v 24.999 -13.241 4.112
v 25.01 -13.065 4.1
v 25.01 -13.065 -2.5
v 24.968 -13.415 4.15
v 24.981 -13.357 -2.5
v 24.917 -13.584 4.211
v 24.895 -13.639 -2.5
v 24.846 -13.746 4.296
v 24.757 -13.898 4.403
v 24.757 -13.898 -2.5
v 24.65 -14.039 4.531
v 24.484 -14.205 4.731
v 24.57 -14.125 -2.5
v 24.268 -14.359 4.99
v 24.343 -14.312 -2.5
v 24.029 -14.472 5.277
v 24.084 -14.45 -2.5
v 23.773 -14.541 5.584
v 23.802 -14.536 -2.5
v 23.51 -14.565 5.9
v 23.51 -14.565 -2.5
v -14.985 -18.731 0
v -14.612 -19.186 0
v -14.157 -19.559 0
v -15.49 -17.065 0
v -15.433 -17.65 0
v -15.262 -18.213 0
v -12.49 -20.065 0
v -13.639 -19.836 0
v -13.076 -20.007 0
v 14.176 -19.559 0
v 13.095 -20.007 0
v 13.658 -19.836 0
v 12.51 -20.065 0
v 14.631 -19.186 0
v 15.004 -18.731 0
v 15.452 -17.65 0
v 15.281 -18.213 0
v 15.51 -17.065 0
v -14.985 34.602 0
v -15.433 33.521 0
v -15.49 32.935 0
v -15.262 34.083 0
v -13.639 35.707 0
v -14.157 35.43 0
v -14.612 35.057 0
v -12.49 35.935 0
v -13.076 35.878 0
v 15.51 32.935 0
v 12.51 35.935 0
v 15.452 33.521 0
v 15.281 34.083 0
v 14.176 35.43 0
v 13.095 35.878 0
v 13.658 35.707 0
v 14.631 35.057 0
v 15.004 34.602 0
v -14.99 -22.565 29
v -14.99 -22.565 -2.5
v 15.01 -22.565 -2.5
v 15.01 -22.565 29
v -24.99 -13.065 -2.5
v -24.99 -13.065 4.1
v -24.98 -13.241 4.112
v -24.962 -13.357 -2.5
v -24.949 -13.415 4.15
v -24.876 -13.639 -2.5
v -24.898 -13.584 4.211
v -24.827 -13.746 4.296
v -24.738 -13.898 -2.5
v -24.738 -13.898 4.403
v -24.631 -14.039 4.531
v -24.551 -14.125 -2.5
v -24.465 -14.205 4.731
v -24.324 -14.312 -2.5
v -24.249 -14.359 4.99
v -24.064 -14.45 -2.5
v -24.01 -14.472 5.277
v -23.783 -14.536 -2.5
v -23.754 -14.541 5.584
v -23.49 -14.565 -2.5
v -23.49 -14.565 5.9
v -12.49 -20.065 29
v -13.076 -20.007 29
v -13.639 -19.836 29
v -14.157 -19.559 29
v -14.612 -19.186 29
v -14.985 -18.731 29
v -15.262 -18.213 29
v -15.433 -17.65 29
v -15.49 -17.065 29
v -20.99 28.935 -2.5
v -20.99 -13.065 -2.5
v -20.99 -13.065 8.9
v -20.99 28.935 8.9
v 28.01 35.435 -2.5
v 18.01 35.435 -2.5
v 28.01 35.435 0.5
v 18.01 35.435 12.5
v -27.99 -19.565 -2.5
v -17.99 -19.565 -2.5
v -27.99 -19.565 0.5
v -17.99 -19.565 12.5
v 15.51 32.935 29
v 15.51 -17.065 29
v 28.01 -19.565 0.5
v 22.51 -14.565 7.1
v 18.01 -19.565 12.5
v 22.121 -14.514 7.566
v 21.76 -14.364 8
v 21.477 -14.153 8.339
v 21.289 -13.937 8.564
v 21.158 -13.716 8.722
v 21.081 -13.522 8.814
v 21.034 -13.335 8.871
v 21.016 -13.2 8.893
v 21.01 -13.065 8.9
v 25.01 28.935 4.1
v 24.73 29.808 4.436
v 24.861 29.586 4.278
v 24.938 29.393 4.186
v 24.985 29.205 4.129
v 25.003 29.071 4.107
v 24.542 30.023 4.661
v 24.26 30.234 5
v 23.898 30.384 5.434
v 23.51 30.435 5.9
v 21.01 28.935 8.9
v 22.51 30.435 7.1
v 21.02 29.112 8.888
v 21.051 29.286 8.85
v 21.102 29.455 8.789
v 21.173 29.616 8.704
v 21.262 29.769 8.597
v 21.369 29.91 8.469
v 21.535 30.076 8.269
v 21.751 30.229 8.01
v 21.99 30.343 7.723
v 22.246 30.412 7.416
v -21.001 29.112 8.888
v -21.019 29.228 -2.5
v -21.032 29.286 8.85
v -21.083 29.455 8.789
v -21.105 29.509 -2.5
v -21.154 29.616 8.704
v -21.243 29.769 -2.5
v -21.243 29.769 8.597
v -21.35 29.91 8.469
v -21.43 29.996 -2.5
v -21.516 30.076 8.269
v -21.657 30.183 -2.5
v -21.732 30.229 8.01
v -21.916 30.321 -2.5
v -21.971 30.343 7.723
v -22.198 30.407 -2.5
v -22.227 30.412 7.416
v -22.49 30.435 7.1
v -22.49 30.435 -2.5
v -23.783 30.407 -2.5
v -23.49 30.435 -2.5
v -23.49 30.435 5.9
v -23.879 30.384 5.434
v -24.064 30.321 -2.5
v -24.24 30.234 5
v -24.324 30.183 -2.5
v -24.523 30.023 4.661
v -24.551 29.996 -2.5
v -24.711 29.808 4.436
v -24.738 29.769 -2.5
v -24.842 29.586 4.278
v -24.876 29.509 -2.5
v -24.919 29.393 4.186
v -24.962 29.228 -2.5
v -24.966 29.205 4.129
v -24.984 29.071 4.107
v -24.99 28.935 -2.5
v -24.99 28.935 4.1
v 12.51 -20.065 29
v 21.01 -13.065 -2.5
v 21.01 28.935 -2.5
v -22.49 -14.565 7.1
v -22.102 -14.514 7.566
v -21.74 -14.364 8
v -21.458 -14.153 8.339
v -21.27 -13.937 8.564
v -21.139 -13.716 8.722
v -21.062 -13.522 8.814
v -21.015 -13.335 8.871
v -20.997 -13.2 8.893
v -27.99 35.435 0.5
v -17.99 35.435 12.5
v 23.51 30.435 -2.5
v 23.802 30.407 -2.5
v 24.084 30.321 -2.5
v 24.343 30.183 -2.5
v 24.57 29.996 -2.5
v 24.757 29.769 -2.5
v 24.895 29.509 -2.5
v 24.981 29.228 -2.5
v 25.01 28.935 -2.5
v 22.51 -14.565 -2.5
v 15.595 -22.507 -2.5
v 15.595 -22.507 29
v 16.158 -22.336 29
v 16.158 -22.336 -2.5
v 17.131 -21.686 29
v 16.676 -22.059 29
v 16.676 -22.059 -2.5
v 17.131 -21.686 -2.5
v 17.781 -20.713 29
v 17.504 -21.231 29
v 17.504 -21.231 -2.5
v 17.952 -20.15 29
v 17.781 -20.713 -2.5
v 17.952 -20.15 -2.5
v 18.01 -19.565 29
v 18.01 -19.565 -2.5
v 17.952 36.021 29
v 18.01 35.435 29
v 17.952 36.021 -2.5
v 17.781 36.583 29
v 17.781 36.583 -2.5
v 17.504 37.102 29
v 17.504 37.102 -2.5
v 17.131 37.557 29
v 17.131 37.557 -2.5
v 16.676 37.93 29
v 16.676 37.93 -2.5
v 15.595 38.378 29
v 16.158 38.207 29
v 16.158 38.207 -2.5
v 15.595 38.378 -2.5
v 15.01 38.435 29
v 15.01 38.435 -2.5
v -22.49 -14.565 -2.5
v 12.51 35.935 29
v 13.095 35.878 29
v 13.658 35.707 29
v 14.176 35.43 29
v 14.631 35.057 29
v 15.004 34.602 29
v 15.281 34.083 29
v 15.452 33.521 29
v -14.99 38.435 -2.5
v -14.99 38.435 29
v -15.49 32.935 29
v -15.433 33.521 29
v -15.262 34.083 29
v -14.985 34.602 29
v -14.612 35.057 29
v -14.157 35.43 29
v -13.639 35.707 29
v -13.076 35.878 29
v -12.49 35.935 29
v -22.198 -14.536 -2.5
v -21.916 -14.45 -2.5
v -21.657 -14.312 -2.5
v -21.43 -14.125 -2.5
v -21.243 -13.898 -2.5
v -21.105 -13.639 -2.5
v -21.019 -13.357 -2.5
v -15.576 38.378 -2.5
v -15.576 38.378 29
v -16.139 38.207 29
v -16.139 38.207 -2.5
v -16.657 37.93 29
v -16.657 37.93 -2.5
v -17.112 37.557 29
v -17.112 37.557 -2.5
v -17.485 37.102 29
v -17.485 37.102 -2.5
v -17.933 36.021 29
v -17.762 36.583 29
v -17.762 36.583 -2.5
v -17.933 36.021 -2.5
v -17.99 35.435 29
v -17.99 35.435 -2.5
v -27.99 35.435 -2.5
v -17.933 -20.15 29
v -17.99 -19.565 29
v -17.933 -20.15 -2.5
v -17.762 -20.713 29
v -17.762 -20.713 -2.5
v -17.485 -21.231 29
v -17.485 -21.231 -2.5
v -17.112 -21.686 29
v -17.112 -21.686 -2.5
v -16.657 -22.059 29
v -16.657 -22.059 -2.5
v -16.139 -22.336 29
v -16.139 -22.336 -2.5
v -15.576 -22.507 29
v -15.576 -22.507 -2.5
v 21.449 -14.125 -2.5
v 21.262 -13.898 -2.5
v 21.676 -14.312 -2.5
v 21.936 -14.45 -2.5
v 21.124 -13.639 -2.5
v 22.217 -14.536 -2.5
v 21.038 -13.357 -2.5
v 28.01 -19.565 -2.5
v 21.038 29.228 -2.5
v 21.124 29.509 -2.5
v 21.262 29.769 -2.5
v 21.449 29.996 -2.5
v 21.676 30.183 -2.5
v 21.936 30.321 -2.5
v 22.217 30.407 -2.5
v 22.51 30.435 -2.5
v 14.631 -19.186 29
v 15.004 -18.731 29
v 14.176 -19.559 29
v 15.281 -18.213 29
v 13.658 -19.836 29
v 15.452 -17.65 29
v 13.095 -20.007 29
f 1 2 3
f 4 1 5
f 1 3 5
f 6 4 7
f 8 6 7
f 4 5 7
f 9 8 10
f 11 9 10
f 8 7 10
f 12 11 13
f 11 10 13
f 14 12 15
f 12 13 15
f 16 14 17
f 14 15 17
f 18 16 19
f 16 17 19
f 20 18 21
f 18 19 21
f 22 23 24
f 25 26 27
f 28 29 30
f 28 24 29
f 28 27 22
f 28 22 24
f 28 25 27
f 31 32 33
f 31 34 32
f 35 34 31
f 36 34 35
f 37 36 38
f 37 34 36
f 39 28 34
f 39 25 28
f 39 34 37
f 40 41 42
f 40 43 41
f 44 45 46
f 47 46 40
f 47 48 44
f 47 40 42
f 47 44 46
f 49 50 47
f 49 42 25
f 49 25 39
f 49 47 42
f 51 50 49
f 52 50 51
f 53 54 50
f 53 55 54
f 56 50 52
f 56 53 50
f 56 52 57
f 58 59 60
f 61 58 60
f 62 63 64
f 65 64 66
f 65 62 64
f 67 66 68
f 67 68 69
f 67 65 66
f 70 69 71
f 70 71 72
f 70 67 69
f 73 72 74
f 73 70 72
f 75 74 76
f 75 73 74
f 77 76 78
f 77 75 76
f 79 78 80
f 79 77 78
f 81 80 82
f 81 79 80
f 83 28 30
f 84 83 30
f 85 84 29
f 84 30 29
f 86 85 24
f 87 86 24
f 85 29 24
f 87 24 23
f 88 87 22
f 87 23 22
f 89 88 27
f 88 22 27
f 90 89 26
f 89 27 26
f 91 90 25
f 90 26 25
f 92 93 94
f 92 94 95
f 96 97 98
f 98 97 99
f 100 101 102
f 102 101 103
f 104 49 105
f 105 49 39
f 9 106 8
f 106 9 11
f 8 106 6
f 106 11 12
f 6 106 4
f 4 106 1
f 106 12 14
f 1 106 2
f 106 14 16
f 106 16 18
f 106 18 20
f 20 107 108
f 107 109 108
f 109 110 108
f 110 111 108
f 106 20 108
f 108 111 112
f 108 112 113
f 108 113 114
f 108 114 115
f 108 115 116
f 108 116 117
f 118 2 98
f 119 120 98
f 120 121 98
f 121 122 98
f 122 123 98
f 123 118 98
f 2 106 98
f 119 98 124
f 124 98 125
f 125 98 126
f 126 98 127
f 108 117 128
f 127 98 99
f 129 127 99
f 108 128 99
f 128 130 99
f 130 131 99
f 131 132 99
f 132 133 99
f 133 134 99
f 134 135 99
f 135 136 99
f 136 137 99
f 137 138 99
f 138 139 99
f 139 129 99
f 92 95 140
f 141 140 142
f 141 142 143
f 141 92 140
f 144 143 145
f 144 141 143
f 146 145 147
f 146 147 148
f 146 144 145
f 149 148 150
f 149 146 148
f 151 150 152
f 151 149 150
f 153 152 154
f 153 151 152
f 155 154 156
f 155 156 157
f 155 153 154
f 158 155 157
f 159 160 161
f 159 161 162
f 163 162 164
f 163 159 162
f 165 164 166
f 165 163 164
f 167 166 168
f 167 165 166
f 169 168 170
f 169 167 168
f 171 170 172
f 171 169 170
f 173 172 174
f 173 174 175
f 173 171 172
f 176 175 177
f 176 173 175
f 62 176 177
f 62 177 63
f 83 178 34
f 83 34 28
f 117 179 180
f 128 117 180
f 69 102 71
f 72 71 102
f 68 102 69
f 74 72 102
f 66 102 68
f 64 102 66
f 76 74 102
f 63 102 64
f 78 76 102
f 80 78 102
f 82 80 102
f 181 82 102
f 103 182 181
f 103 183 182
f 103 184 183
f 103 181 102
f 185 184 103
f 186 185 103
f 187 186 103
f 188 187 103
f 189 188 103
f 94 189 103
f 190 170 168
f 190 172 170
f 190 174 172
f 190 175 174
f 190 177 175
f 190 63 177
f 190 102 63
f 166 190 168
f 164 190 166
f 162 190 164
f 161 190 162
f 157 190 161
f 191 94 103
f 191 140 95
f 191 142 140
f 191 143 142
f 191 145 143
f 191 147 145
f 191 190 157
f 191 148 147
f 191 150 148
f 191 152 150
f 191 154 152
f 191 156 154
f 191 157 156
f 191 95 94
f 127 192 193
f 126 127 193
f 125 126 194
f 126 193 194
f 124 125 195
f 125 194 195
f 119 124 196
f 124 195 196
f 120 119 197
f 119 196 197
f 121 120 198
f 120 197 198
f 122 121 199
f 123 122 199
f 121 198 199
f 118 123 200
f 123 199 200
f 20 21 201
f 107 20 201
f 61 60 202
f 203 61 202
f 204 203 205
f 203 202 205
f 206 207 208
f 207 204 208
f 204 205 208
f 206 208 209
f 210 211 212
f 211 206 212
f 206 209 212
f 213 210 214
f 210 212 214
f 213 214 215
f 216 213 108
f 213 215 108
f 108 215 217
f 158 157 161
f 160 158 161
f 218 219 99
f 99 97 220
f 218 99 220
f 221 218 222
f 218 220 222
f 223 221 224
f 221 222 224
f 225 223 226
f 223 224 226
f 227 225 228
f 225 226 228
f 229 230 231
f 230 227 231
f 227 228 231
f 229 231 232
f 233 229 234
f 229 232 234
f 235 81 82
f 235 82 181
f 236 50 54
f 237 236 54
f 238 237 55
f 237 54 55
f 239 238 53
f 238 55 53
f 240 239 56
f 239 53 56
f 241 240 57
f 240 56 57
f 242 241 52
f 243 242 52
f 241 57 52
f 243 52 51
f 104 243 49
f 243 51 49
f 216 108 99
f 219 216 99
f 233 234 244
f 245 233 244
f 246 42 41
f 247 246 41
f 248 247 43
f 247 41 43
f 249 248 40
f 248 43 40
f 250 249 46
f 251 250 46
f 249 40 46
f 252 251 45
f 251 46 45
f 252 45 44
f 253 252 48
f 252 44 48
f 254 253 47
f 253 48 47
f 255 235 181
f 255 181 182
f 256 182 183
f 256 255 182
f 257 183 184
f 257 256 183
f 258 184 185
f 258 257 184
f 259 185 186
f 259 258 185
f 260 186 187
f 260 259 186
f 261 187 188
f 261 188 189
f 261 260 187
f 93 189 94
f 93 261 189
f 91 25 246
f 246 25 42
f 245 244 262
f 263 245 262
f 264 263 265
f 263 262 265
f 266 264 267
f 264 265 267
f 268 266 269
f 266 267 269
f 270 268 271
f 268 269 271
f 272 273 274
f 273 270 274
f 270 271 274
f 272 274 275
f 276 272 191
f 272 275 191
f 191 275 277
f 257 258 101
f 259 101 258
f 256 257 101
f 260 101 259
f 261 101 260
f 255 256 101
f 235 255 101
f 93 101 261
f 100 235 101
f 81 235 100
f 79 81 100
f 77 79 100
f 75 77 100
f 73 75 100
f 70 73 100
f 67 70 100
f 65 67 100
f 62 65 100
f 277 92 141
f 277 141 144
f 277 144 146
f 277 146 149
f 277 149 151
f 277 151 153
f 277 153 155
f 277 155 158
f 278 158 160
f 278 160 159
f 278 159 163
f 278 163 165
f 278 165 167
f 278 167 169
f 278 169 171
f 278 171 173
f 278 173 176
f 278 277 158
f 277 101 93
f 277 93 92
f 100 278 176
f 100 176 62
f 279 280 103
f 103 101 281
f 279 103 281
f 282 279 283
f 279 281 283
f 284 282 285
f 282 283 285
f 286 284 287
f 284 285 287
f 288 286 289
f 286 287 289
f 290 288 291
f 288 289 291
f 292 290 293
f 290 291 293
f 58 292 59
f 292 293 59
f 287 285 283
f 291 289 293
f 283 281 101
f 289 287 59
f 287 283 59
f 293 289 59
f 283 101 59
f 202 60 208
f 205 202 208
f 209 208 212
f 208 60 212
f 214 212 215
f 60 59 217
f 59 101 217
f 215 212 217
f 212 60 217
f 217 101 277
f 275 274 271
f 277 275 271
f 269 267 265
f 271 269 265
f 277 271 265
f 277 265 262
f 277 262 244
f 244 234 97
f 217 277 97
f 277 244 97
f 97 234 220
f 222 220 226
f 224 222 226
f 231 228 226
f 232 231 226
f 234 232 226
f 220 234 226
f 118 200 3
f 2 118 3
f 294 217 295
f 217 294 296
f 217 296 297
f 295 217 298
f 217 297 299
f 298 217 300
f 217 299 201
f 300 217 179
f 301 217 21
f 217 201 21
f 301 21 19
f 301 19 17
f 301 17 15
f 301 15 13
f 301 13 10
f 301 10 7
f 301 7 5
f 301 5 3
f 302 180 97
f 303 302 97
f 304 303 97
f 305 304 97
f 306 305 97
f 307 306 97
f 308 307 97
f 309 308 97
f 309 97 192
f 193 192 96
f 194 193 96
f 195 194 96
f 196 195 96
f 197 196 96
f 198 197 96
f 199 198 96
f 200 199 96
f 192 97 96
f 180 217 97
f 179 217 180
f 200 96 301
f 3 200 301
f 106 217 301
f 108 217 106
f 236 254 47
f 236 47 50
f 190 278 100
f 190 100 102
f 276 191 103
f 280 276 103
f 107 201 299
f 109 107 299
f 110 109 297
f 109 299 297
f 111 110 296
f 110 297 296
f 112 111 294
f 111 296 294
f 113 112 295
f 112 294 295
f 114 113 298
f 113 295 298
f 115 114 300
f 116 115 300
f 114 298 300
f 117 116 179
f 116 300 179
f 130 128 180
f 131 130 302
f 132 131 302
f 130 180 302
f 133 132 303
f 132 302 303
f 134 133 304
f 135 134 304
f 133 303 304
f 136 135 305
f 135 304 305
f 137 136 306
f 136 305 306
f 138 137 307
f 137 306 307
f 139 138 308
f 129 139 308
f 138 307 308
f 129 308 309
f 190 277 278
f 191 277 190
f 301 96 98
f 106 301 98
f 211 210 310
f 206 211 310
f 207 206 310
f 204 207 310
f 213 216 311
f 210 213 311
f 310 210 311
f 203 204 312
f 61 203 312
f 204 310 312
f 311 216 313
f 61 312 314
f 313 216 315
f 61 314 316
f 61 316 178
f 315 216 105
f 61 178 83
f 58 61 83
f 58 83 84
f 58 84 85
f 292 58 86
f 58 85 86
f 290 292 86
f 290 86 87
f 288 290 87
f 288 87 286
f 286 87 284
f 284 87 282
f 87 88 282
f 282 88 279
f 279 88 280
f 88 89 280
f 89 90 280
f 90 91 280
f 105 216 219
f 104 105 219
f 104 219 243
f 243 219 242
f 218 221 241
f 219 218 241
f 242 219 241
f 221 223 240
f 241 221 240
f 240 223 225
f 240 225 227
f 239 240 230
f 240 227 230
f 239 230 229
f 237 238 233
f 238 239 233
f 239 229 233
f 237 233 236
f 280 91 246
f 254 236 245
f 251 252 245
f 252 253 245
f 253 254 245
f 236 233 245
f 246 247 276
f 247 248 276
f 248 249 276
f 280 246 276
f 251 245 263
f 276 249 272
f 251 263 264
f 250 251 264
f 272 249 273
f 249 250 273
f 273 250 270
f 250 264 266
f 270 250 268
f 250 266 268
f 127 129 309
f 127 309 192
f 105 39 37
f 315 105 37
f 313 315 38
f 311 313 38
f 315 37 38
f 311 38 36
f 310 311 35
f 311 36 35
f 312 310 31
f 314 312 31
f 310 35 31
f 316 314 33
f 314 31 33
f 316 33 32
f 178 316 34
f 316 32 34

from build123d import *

# Parameters (mm, degrees)
SHELL_DEPTH         = 29
BOTTOM_START        = 2.5
BOTTOM_COVER_DEPTH  = 2.5
BOSS_EXTRUDE4_DEPTH = 55
CUT_EXTRUDE1_DEPTH  = 64


with BuildPart() as part:
    # Sketch1 → Shell (new body)
    with BuildSketch(Plane.XY):
        with BuildLine():
            Line((-14.99046496, 38.43538022), (15.00953504, 38.43538022))
            ThreePointArc((15.00953504, 38.43538022), (17.130855384, 37.556700564), (18.00953504, 35.43538022))
            Line((18.00953504, 35.43538022), (18.00953504, -19.56461978))
            ThreePointArc((18.00953504, -19.56461978), (17.130855384, -21.685940124), (15.00953504, -22.56461978))
            Line((15.00953504, -22.56461978), (-14.99046496, -22.56461978))
            ThreePointArc((-14.99046496, -22.56461978), (-17.111785303, -21.685940124), (-17.99046496, -19.56461978))
            Line((-17.99046496, -19.56461978), (-17.99046496, 35.43538022))
            ThreePointArc((-17.99046496, 35.43538022), (-17.111785303, 37.556700564), (-14.99046496, 38.43538022))
        make_face()
        with BuildLine():
            Line((-12.49046496, 35.93538022), (12.50953504, 35.93538022))
            ThreePointArc((12.50953504, 35.93538022), (14.630855384, 35.056700564), (15.50953504, 32.93538022))
            Line((15.50953504, 32.93538022), (15.50953504, -17.06461978))
            ThreePointArc((15.50953504, -17.06461978), (14.630855384, -19.185940124), (12.50953504, -20.06461978))
            Line((12.50953504, -20.06461978), (-12.49046496, -20.06461978))
            ThreePointArc((-12.49046496, -20.06461978), (-14.611785303, -19.185940124), (-15.49046496, -17.06461978))
            Line((-15.49046496, -17.06461978), (-15.49046496, 32.93538022))
            ThreePointArc((-15.49046496, 32.93538022), (-14.611785303, 35.056700564), (-12.49046496, 35.93538022))
        make_face(mode=Mode.SUBTRACT)
    extrude(amount=SHELL_DEPTH)

    # Sketch3 → Bottom cover (add)
    with BuildSketch(Plane(origin=(0, 0, 0), x_dir=(-1, 0, 0), z_dir=(0, 0, -1)).offset(BOTTOM_START)):
        with BuildLine():
            Line((-15.00953504, 38.43538022), (14.99046496, 38.43538022))
            ThreePointArc((14.99046496, 38.43538022), (17.111785303, 37.556700564), (17.99046496, 35.43538022))
            Line((17.99046496, 35.43538022), (17.99046496, -19.56461978))
            ThreePointArc((17.99046496, -19.56461978), (17.111785303, -21.685940124), (14.99046496, -22.56461978))
            Line((14.99046496, -22.56461978), (-15.00953504, -22.56461978))
            ThreePointArc((-15.00953504, -22.56461978), (-17.130855384, -21.685940124), (-18.00953504, -19.56461978))
            Line((-18.00953504, -19.56461978), (-18.00953504, 35.43538022))
            ThreePointArc((-18.00953504, 35.43538022), (-17.130855384, 37.556700564), (-15.00953504, 38.43538022))
        make_face()
    extrude(amount=-BOTTOM_COVER_DEPTH)


with BuildPart() as boss_extrude4_tool:
    # 3DSketch1 → Boss-Extrude4 (new body)
    with BuildSketch(Plane(origin=(18.009536245, 35.43538022, -2.500000038), x_dir=(-0.99788010602318, 0, 0.06507913646605183), z_dir=(0, 1, 0))):
        Polygon((0, 0), (-9.97880106, 0.650791365), (-9.783563651, 3.644431683), (0.976187047, 14.96820159), align=None)
        Polygon((35.923685021, -2.342848953), (45.902486082, -2.993640318), (46.097723491, 0), (36.899872068, 12.625352637), align=None)
    extrude(amount=-BOSS_EXTRUDE4_DEPTH)


with BuildPart() as part_1:
    add(part.part)


with BuildPart() as part_2:
    # Boss-Extrude4: joined with boss_extrude4_tool
    add(part_1.part.fuse(boss_extrude4_tool.part, tol=0.00001))

    # Sketch9 → Cut-Extrude1 (cut)
    with BuildSketch(Plane(origin=(0, 0, -2.5), x_dir=(-1, 0, 0), z_dir=(0, 0, -1))):
        with BuildLine():
            Line((-23.50953504, -14.56461978), (-22.50953504, -14.56461978))
            ThreePointArc((-22.50953504, -14.56461978), (-21.448874869, -14.125279952), (-21.00953504, -13.06461978))
            Line((-21.00953504, -13.06461978), (-21.00953504, 28.93538022))
            ThreePointArc((-21.00953504, 28.93538022), (-21.448874869, 29.996040392), (-22.50953504, 30.43538022))
            Line((-22.50953504, 30.43538022), (-23.50953504, 30.43538022))
            ThreePointArc((-23.50953504, 30.43538022), (-24.570195212, 29.996040392), (-25.00953504, 28.93538022))
            Line((-25.00953504, 28.93538022), (-25.00953504, -13.06461978))
            ThreePointArc((-25.00953504, -13.06461978), (-24.570195212, -14.125279952), (-23.50953504, -14.56461978))
        make_face()
        with BuildLine():
            Line((22.49046496, 30.43538022), (23.49046496, 30.43538022))
            ThreePointArc((23.49046496, 30.43538022), (24.551125131, 29.996040392), (24.99046496, 28.93538022))
            Line((24.99046496, 28.93538022), (24.99046496, -13.06461978))
            ThreePointArc((24.99046496, -13.06461978), (24.551125131, -14.125279952), (23.49046496, -14.56461978))
            Line((23.49046496, -14.56461978), (22.49046496, -14.56461978))
            ThreePointArc((22.49046496, -14.56461978), (21.429804788, -14.125279952), (20.99046496, -13.06461978))
            Line((20.99046496, -13.06461978), (20.99046496, 28.93538022))
            ThreePointArc((20.99046496, 28.93538022), (21.429804788, 29.996040392), (22.49046496, 30.43538022))
        make_face()
    extrude(amount=-CUT_EXTRUDE1_DEPTH, mode=Mode.SUBTRACT)


solid = part_2.part
